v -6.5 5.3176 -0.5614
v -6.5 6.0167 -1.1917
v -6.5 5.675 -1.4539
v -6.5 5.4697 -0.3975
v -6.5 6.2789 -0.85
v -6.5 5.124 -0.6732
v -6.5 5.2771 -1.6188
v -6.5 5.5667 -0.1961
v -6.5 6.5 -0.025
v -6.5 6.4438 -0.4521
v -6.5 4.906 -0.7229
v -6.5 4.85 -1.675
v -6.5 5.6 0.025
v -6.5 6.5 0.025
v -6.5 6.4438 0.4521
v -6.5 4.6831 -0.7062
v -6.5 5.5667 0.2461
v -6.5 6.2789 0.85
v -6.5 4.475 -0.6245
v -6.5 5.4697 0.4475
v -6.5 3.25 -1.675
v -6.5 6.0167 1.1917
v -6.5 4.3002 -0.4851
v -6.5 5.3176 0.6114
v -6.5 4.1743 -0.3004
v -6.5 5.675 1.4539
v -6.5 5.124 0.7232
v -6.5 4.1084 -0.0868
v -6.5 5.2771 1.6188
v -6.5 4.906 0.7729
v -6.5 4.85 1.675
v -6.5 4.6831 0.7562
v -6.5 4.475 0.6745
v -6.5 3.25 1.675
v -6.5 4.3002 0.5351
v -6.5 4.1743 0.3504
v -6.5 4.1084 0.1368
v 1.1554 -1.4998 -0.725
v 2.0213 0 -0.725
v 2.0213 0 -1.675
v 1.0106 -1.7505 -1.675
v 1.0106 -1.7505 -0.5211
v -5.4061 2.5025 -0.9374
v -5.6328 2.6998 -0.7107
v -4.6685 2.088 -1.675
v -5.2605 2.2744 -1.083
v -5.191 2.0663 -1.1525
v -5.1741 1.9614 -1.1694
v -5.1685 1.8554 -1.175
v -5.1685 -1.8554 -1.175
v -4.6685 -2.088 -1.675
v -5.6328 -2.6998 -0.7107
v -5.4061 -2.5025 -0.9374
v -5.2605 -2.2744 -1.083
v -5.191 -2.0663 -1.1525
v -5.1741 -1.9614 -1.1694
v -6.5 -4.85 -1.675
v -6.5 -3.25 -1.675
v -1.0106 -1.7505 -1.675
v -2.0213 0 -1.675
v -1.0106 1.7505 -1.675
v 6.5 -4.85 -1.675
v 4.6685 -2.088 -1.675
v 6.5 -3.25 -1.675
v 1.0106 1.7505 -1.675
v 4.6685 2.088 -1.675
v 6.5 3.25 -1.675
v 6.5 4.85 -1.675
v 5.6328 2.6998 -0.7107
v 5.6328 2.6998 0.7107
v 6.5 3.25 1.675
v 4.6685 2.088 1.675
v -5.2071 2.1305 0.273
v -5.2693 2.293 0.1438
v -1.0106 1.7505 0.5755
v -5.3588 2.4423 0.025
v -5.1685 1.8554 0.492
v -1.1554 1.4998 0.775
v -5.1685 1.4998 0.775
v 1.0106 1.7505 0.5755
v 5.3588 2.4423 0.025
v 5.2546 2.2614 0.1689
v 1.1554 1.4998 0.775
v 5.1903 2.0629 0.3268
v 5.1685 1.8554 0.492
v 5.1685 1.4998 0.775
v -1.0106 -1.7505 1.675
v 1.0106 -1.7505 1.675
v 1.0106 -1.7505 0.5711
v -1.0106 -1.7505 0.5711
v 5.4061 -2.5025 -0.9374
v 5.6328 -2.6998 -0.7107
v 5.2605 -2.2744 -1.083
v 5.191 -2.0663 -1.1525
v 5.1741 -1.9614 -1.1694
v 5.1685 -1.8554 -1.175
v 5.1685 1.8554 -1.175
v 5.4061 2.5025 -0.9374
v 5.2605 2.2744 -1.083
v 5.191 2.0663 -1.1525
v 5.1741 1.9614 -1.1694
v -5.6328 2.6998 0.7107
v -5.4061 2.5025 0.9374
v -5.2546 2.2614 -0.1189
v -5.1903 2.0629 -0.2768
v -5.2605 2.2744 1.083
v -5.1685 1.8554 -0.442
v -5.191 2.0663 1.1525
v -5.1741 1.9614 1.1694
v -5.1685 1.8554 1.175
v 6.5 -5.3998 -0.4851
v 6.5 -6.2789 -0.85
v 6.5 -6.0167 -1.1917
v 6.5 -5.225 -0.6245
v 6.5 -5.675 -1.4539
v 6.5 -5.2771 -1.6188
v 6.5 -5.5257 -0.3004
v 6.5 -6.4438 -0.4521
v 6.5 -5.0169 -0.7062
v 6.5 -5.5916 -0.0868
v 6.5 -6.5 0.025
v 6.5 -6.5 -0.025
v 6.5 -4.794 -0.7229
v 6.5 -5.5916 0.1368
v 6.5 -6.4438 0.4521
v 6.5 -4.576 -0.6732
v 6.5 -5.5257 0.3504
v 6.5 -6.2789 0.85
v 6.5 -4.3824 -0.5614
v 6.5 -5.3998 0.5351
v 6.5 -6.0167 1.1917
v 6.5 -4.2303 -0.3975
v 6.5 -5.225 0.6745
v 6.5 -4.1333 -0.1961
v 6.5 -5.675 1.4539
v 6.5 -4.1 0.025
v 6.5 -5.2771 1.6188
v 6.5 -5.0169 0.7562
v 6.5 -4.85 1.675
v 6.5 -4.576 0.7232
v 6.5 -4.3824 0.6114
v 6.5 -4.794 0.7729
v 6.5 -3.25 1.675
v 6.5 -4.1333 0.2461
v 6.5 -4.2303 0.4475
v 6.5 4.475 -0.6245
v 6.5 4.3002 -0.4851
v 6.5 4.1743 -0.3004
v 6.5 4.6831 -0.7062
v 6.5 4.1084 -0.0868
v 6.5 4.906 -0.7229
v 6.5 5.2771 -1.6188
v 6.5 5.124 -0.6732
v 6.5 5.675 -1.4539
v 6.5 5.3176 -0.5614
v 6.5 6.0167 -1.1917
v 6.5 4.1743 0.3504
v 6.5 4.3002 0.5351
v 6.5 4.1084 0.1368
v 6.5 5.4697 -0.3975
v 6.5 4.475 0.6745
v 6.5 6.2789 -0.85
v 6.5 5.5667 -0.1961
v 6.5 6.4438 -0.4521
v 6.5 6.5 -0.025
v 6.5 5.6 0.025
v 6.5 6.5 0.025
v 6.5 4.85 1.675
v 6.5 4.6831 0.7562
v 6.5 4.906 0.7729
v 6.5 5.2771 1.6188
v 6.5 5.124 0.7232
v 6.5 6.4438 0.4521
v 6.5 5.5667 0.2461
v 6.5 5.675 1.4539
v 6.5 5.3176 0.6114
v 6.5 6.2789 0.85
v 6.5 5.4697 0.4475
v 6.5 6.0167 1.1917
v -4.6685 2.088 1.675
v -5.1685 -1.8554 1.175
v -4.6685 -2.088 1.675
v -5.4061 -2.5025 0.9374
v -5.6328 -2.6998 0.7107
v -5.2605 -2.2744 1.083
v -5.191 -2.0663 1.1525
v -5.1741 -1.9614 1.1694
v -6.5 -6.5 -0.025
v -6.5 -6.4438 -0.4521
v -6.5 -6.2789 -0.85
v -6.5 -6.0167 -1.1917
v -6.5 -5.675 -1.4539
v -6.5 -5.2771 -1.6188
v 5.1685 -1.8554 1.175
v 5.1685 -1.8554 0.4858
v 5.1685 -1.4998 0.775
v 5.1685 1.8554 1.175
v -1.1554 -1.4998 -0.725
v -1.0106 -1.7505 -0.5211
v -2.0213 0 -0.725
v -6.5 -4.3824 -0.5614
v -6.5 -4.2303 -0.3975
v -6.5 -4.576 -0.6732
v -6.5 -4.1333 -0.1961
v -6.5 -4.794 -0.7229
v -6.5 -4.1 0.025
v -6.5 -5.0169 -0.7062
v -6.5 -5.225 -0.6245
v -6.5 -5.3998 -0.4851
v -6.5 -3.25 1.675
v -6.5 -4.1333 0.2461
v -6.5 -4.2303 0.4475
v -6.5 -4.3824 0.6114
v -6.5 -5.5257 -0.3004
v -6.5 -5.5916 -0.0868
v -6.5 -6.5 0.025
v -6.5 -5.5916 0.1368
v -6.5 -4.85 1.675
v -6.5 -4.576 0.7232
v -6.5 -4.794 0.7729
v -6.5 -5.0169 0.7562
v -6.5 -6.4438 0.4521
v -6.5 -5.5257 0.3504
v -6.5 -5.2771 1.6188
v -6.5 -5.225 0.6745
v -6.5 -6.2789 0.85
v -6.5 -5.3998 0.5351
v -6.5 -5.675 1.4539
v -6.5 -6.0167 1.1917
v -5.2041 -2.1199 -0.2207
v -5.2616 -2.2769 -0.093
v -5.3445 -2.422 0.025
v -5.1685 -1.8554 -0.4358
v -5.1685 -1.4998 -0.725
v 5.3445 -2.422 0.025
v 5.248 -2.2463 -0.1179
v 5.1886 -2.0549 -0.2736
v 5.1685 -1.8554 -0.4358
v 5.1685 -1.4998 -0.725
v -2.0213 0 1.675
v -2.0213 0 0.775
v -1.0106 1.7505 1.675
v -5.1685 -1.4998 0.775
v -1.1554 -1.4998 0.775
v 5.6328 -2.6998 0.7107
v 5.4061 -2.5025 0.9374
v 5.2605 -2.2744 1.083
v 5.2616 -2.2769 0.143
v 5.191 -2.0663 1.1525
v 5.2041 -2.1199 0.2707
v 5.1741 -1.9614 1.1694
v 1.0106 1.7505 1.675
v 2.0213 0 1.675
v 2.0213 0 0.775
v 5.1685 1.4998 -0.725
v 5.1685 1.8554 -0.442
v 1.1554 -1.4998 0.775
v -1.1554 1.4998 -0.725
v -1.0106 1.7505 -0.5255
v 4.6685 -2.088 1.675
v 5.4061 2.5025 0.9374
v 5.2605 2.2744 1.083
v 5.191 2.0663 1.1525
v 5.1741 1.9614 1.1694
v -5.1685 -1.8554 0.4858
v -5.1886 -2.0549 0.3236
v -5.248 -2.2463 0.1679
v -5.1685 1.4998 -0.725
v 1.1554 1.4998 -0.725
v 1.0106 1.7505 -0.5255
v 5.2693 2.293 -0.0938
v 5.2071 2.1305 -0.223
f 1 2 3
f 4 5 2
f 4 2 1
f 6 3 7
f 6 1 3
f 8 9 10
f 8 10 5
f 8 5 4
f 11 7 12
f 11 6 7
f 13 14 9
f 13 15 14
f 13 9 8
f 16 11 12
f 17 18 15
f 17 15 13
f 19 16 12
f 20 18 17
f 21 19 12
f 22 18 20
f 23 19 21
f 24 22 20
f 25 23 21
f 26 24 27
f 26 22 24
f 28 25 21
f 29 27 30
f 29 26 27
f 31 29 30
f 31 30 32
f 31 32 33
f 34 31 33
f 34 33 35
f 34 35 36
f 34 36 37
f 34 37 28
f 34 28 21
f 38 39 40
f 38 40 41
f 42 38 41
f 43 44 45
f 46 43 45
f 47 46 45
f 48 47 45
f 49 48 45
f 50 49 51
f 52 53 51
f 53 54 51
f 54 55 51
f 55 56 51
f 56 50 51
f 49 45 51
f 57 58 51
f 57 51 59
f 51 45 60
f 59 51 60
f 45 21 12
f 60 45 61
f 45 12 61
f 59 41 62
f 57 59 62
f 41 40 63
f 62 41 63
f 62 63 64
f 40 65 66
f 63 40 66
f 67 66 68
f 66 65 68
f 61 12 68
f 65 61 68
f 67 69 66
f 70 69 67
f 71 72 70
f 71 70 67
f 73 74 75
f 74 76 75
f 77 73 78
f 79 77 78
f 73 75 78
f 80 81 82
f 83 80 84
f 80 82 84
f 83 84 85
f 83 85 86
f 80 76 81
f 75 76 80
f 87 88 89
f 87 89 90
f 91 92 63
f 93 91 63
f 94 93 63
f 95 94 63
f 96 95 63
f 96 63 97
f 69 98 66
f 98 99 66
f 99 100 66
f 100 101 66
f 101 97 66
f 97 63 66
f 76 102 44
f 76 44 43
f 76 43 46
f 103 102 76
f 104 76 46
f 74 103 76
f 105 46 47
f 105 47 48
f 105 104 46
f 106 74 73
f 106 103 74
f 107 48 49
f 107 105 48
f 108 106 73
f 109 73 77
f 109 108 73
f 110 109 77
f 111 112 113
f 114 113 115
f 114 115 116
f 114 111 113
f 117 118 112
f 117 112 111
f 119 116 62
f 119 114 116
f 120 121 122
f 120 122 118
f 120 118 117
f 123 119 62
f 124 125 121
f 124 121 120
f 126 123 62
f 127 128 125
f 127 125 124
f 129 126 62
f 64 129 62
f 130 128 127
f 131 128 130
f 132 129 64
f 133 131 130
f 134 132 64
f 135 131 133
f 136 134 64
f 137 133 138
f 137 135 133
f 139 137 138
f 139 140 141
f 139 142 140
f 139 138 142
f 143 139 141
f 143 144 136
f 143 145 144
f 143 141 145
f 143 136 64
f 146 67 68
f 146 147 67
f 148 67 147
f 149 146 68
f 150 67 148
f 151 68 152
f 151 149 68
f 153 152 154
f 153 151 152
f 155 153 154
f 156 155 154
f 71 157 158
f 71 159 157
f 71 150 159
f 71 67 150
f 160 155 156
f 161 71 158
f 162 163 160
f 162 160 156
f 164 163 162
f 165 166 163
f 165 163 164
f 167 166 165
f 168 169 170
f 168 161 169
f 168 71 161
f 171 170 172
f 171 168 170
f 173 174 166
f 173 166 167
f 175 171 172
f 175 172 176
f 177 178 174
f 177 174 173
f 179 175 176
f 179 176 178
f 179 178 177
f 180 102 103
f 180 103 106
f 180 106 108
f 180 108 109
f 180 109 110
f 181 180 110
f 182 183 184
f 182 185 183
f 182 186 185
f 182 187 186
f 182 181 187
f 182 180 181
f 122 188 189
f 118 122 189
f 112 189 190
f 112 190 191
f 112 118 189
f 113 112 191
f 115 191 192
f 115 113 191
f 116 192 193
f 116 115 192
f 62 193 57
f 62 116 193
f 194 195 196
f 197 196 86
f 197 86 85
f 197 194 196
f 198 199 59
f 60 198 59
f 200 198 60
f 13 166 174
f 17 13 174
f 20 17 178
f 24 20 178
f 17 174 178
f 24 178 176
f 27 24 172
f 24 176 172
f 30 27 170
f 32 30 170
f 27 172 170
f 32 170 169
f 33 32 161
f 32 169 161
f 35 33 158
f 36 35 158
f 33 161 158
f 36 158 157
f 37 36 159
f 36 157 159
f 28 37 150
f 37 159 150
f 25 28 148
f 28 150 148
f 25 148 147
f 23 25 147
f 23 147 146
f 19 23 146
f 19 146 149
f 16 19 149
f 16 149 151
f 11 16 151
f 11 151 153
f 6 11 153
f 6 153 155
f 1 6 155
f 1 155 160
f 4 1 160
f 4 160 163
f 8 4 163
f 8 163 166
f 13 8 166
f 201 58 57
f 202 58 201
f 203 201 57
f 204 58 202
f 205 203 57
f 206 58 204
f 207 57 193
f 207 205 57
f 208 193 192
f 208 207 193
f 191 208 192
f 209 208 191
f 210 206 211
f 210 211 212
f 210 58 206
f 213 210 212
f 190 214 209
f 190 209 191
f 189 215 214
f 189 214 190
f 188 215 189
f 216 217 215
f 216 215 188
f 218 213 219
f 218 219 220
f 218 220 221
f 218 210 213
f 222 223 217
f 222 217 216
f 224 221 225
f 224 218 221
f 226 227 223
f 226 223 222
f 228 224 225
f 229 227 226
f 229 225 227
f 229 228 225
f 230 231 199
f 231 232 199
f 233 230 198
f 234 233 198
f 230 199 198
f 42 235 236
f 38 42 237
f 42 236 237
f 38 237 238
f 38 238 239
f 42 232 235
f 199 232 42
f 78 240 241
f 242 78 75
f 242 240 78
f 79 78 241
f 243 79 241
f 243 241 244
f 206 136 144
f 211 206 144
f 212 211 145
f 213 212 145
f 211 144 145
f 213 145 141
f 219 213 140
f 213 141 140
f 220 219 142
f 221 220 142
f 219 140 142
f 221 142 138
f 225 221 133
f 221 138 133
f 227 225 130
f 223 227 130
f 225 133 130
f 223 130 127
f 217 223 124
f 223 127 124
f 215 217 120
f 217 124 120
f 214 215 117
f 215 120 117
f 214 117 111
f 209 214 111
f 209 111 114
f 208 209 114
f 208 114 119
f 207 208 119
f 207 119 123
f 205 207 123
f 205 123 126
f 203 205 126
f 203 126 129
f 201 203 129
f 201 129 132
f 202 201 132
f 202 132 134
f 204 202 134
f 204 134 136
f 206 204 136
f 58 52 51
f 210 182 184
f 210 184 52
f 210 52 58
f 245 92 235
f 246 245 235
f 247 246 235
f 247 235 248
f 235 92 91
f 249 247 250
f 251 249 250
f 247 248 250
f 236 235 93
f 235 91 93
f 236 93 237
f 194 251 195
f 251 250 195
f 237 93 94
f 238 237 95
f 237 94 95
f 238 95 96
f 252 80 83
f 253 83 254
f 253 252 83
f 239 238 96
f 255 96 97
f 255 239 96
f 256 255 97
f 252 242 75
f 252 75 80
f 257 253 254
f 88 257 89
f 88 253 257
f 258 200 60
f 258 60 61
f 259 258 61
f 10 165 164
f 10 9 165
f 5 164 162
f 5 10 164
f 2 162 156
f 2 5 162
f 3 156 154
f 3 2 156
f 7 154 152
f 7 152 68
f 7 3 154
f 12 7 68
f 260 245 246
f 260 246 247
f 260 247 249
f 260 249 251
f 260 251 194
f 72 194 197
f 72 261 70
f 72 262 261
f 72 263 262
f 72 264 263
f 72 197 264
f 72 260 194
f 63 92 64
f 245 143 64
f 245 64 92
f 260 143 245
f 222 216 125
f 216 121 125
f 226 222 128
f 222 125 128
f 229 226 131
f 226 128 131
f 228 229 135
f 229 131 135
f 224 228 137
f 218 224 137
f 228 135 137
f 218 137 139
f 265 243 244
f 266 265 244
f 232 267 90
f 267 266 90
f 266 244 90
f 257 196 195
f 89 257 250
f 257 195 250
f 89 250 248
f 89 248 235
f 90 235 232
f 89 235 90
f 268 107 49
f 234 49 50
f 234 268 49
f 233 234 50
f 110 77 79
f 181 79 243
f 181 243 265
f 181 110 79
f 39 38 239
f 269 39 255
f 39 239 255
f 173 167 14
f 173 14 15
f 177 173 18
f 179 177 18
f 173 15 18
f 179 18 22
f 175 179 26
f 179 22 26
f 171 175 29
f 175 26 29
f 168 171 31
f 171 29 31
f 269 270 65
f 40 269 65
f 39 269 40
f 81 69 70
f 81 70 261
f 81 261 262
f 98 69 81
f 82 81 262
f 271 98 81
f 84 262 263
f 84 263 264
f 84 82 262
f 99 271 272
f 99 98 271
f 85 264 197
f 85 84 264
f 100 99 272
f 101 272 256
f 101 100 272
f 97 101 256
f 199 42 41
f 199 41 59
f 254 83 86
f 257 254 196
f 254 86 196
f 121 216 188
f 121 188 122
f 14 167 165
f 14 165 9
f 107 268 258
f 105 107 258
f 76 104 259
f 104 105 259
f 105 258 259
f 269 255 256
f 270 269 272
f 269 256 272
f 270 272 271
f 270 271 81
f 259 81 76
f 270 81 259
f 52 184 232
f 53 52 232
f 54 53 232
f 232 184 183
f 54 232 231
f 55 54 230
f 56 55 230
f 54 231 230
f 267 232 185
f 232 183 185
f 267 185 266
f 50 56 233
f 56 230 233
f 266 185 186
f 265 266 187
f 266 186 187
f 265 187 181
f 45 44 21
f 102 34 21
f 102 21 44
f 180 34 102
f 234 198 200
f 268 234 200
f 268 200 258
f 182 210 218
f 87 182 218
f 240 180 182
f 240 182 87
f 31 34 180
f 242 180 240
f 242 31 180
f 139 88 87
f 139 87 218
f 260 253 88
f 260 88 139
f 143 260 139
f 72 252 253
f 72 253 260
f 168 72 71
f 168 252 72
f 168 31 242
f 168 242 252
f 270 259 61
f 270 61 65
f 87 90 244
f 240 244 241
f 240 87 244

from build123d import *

# Parameters (mm, degrees)
F1_DEPTH = 1.675
F2_SIZE  = 0.5
F3_R     = 1.65
F4_R     = 1
F5_R     = 0.75
F6_DEPTH = 13.001


with BuildPart() as f1:
    # F0 (on Top) → F1 (new body, symmetric)
    with BuildSketch(Plane.XY):
        Polygon((6.5, 6.5), (-6.5, 6.5), (-6.5, 3.25), (-5.168492, 2.405253), (-5.168492, -2.405253), (-6.5, -3.25), (-6.5, -6.5), (6.5, -6.5), (6.5, -3.25), (5.168492, -2.405253), (5.168492, 2.405253), (6.5, 3.25), align=None)
        Polygon((-2.021299, 0), (-1.01065, 1.750496), (1.01065, 1.750496), (2.021299, 0), (1.01065, -1.750496), (-1.01065, -1.750496), align=None, mode=Mode.SUBTRACT)
    extrude(amount=F1_DEPTH, both=True)

    # F2
    f2_edges = [f1.edges().sort_by_distance(p)[0] for p in [
        (-5.168492, 0, 1.675),
        (5.168492, 0, 1.675),
        (-5.168492, 0, -1.675),
        (5.168492, 0, -1.675),
    ]]
    chamfer(f2_edges, length=F2_SIZE)

    # F3
    f3_edges = [f1.edges().sort_by_distance(p)[0] for p in [
        (0, 6.5, 1.675),
        (0, 6.5, -1.675),
        (0, -6.5, 1.675),
        (0, -6.5, -1.675),
    ]]
    fillet(f3_edges, radius=F3_R)

    # F4
    f4_edges = [f1.edges().sort_by_distance(p)[0] for p in [
        (5.168492, 2.405253, 0),
        (5.168492, -2.405253, 0),
        (-5.168492, -2.405253, 0),
        (-5.168492, 2.405253, 0),
    ]]
    fillet(f4_edges, radius=F4_R)

    # F5 (on face) → F6 (cut, through all)
    with BuildSketch(Plane.YZ.offset(6.5)):
        with Locations((-4.85, 0.025)):
            Circle(F5_R)
        with Locations((4.85, 0.025)):
            Circle(F5_R)
        Polygon((-1.499787, 0.775), (-2.422007, 0.025), (-1.499787, -0.725), (1.499787, -0.725), (2.442251, 0.025), (1.499787, 0.775), align=None)
    extrude(amount=-F6_DEPTH, mode=Mode.SUBTRACT)


solid = f1.part
